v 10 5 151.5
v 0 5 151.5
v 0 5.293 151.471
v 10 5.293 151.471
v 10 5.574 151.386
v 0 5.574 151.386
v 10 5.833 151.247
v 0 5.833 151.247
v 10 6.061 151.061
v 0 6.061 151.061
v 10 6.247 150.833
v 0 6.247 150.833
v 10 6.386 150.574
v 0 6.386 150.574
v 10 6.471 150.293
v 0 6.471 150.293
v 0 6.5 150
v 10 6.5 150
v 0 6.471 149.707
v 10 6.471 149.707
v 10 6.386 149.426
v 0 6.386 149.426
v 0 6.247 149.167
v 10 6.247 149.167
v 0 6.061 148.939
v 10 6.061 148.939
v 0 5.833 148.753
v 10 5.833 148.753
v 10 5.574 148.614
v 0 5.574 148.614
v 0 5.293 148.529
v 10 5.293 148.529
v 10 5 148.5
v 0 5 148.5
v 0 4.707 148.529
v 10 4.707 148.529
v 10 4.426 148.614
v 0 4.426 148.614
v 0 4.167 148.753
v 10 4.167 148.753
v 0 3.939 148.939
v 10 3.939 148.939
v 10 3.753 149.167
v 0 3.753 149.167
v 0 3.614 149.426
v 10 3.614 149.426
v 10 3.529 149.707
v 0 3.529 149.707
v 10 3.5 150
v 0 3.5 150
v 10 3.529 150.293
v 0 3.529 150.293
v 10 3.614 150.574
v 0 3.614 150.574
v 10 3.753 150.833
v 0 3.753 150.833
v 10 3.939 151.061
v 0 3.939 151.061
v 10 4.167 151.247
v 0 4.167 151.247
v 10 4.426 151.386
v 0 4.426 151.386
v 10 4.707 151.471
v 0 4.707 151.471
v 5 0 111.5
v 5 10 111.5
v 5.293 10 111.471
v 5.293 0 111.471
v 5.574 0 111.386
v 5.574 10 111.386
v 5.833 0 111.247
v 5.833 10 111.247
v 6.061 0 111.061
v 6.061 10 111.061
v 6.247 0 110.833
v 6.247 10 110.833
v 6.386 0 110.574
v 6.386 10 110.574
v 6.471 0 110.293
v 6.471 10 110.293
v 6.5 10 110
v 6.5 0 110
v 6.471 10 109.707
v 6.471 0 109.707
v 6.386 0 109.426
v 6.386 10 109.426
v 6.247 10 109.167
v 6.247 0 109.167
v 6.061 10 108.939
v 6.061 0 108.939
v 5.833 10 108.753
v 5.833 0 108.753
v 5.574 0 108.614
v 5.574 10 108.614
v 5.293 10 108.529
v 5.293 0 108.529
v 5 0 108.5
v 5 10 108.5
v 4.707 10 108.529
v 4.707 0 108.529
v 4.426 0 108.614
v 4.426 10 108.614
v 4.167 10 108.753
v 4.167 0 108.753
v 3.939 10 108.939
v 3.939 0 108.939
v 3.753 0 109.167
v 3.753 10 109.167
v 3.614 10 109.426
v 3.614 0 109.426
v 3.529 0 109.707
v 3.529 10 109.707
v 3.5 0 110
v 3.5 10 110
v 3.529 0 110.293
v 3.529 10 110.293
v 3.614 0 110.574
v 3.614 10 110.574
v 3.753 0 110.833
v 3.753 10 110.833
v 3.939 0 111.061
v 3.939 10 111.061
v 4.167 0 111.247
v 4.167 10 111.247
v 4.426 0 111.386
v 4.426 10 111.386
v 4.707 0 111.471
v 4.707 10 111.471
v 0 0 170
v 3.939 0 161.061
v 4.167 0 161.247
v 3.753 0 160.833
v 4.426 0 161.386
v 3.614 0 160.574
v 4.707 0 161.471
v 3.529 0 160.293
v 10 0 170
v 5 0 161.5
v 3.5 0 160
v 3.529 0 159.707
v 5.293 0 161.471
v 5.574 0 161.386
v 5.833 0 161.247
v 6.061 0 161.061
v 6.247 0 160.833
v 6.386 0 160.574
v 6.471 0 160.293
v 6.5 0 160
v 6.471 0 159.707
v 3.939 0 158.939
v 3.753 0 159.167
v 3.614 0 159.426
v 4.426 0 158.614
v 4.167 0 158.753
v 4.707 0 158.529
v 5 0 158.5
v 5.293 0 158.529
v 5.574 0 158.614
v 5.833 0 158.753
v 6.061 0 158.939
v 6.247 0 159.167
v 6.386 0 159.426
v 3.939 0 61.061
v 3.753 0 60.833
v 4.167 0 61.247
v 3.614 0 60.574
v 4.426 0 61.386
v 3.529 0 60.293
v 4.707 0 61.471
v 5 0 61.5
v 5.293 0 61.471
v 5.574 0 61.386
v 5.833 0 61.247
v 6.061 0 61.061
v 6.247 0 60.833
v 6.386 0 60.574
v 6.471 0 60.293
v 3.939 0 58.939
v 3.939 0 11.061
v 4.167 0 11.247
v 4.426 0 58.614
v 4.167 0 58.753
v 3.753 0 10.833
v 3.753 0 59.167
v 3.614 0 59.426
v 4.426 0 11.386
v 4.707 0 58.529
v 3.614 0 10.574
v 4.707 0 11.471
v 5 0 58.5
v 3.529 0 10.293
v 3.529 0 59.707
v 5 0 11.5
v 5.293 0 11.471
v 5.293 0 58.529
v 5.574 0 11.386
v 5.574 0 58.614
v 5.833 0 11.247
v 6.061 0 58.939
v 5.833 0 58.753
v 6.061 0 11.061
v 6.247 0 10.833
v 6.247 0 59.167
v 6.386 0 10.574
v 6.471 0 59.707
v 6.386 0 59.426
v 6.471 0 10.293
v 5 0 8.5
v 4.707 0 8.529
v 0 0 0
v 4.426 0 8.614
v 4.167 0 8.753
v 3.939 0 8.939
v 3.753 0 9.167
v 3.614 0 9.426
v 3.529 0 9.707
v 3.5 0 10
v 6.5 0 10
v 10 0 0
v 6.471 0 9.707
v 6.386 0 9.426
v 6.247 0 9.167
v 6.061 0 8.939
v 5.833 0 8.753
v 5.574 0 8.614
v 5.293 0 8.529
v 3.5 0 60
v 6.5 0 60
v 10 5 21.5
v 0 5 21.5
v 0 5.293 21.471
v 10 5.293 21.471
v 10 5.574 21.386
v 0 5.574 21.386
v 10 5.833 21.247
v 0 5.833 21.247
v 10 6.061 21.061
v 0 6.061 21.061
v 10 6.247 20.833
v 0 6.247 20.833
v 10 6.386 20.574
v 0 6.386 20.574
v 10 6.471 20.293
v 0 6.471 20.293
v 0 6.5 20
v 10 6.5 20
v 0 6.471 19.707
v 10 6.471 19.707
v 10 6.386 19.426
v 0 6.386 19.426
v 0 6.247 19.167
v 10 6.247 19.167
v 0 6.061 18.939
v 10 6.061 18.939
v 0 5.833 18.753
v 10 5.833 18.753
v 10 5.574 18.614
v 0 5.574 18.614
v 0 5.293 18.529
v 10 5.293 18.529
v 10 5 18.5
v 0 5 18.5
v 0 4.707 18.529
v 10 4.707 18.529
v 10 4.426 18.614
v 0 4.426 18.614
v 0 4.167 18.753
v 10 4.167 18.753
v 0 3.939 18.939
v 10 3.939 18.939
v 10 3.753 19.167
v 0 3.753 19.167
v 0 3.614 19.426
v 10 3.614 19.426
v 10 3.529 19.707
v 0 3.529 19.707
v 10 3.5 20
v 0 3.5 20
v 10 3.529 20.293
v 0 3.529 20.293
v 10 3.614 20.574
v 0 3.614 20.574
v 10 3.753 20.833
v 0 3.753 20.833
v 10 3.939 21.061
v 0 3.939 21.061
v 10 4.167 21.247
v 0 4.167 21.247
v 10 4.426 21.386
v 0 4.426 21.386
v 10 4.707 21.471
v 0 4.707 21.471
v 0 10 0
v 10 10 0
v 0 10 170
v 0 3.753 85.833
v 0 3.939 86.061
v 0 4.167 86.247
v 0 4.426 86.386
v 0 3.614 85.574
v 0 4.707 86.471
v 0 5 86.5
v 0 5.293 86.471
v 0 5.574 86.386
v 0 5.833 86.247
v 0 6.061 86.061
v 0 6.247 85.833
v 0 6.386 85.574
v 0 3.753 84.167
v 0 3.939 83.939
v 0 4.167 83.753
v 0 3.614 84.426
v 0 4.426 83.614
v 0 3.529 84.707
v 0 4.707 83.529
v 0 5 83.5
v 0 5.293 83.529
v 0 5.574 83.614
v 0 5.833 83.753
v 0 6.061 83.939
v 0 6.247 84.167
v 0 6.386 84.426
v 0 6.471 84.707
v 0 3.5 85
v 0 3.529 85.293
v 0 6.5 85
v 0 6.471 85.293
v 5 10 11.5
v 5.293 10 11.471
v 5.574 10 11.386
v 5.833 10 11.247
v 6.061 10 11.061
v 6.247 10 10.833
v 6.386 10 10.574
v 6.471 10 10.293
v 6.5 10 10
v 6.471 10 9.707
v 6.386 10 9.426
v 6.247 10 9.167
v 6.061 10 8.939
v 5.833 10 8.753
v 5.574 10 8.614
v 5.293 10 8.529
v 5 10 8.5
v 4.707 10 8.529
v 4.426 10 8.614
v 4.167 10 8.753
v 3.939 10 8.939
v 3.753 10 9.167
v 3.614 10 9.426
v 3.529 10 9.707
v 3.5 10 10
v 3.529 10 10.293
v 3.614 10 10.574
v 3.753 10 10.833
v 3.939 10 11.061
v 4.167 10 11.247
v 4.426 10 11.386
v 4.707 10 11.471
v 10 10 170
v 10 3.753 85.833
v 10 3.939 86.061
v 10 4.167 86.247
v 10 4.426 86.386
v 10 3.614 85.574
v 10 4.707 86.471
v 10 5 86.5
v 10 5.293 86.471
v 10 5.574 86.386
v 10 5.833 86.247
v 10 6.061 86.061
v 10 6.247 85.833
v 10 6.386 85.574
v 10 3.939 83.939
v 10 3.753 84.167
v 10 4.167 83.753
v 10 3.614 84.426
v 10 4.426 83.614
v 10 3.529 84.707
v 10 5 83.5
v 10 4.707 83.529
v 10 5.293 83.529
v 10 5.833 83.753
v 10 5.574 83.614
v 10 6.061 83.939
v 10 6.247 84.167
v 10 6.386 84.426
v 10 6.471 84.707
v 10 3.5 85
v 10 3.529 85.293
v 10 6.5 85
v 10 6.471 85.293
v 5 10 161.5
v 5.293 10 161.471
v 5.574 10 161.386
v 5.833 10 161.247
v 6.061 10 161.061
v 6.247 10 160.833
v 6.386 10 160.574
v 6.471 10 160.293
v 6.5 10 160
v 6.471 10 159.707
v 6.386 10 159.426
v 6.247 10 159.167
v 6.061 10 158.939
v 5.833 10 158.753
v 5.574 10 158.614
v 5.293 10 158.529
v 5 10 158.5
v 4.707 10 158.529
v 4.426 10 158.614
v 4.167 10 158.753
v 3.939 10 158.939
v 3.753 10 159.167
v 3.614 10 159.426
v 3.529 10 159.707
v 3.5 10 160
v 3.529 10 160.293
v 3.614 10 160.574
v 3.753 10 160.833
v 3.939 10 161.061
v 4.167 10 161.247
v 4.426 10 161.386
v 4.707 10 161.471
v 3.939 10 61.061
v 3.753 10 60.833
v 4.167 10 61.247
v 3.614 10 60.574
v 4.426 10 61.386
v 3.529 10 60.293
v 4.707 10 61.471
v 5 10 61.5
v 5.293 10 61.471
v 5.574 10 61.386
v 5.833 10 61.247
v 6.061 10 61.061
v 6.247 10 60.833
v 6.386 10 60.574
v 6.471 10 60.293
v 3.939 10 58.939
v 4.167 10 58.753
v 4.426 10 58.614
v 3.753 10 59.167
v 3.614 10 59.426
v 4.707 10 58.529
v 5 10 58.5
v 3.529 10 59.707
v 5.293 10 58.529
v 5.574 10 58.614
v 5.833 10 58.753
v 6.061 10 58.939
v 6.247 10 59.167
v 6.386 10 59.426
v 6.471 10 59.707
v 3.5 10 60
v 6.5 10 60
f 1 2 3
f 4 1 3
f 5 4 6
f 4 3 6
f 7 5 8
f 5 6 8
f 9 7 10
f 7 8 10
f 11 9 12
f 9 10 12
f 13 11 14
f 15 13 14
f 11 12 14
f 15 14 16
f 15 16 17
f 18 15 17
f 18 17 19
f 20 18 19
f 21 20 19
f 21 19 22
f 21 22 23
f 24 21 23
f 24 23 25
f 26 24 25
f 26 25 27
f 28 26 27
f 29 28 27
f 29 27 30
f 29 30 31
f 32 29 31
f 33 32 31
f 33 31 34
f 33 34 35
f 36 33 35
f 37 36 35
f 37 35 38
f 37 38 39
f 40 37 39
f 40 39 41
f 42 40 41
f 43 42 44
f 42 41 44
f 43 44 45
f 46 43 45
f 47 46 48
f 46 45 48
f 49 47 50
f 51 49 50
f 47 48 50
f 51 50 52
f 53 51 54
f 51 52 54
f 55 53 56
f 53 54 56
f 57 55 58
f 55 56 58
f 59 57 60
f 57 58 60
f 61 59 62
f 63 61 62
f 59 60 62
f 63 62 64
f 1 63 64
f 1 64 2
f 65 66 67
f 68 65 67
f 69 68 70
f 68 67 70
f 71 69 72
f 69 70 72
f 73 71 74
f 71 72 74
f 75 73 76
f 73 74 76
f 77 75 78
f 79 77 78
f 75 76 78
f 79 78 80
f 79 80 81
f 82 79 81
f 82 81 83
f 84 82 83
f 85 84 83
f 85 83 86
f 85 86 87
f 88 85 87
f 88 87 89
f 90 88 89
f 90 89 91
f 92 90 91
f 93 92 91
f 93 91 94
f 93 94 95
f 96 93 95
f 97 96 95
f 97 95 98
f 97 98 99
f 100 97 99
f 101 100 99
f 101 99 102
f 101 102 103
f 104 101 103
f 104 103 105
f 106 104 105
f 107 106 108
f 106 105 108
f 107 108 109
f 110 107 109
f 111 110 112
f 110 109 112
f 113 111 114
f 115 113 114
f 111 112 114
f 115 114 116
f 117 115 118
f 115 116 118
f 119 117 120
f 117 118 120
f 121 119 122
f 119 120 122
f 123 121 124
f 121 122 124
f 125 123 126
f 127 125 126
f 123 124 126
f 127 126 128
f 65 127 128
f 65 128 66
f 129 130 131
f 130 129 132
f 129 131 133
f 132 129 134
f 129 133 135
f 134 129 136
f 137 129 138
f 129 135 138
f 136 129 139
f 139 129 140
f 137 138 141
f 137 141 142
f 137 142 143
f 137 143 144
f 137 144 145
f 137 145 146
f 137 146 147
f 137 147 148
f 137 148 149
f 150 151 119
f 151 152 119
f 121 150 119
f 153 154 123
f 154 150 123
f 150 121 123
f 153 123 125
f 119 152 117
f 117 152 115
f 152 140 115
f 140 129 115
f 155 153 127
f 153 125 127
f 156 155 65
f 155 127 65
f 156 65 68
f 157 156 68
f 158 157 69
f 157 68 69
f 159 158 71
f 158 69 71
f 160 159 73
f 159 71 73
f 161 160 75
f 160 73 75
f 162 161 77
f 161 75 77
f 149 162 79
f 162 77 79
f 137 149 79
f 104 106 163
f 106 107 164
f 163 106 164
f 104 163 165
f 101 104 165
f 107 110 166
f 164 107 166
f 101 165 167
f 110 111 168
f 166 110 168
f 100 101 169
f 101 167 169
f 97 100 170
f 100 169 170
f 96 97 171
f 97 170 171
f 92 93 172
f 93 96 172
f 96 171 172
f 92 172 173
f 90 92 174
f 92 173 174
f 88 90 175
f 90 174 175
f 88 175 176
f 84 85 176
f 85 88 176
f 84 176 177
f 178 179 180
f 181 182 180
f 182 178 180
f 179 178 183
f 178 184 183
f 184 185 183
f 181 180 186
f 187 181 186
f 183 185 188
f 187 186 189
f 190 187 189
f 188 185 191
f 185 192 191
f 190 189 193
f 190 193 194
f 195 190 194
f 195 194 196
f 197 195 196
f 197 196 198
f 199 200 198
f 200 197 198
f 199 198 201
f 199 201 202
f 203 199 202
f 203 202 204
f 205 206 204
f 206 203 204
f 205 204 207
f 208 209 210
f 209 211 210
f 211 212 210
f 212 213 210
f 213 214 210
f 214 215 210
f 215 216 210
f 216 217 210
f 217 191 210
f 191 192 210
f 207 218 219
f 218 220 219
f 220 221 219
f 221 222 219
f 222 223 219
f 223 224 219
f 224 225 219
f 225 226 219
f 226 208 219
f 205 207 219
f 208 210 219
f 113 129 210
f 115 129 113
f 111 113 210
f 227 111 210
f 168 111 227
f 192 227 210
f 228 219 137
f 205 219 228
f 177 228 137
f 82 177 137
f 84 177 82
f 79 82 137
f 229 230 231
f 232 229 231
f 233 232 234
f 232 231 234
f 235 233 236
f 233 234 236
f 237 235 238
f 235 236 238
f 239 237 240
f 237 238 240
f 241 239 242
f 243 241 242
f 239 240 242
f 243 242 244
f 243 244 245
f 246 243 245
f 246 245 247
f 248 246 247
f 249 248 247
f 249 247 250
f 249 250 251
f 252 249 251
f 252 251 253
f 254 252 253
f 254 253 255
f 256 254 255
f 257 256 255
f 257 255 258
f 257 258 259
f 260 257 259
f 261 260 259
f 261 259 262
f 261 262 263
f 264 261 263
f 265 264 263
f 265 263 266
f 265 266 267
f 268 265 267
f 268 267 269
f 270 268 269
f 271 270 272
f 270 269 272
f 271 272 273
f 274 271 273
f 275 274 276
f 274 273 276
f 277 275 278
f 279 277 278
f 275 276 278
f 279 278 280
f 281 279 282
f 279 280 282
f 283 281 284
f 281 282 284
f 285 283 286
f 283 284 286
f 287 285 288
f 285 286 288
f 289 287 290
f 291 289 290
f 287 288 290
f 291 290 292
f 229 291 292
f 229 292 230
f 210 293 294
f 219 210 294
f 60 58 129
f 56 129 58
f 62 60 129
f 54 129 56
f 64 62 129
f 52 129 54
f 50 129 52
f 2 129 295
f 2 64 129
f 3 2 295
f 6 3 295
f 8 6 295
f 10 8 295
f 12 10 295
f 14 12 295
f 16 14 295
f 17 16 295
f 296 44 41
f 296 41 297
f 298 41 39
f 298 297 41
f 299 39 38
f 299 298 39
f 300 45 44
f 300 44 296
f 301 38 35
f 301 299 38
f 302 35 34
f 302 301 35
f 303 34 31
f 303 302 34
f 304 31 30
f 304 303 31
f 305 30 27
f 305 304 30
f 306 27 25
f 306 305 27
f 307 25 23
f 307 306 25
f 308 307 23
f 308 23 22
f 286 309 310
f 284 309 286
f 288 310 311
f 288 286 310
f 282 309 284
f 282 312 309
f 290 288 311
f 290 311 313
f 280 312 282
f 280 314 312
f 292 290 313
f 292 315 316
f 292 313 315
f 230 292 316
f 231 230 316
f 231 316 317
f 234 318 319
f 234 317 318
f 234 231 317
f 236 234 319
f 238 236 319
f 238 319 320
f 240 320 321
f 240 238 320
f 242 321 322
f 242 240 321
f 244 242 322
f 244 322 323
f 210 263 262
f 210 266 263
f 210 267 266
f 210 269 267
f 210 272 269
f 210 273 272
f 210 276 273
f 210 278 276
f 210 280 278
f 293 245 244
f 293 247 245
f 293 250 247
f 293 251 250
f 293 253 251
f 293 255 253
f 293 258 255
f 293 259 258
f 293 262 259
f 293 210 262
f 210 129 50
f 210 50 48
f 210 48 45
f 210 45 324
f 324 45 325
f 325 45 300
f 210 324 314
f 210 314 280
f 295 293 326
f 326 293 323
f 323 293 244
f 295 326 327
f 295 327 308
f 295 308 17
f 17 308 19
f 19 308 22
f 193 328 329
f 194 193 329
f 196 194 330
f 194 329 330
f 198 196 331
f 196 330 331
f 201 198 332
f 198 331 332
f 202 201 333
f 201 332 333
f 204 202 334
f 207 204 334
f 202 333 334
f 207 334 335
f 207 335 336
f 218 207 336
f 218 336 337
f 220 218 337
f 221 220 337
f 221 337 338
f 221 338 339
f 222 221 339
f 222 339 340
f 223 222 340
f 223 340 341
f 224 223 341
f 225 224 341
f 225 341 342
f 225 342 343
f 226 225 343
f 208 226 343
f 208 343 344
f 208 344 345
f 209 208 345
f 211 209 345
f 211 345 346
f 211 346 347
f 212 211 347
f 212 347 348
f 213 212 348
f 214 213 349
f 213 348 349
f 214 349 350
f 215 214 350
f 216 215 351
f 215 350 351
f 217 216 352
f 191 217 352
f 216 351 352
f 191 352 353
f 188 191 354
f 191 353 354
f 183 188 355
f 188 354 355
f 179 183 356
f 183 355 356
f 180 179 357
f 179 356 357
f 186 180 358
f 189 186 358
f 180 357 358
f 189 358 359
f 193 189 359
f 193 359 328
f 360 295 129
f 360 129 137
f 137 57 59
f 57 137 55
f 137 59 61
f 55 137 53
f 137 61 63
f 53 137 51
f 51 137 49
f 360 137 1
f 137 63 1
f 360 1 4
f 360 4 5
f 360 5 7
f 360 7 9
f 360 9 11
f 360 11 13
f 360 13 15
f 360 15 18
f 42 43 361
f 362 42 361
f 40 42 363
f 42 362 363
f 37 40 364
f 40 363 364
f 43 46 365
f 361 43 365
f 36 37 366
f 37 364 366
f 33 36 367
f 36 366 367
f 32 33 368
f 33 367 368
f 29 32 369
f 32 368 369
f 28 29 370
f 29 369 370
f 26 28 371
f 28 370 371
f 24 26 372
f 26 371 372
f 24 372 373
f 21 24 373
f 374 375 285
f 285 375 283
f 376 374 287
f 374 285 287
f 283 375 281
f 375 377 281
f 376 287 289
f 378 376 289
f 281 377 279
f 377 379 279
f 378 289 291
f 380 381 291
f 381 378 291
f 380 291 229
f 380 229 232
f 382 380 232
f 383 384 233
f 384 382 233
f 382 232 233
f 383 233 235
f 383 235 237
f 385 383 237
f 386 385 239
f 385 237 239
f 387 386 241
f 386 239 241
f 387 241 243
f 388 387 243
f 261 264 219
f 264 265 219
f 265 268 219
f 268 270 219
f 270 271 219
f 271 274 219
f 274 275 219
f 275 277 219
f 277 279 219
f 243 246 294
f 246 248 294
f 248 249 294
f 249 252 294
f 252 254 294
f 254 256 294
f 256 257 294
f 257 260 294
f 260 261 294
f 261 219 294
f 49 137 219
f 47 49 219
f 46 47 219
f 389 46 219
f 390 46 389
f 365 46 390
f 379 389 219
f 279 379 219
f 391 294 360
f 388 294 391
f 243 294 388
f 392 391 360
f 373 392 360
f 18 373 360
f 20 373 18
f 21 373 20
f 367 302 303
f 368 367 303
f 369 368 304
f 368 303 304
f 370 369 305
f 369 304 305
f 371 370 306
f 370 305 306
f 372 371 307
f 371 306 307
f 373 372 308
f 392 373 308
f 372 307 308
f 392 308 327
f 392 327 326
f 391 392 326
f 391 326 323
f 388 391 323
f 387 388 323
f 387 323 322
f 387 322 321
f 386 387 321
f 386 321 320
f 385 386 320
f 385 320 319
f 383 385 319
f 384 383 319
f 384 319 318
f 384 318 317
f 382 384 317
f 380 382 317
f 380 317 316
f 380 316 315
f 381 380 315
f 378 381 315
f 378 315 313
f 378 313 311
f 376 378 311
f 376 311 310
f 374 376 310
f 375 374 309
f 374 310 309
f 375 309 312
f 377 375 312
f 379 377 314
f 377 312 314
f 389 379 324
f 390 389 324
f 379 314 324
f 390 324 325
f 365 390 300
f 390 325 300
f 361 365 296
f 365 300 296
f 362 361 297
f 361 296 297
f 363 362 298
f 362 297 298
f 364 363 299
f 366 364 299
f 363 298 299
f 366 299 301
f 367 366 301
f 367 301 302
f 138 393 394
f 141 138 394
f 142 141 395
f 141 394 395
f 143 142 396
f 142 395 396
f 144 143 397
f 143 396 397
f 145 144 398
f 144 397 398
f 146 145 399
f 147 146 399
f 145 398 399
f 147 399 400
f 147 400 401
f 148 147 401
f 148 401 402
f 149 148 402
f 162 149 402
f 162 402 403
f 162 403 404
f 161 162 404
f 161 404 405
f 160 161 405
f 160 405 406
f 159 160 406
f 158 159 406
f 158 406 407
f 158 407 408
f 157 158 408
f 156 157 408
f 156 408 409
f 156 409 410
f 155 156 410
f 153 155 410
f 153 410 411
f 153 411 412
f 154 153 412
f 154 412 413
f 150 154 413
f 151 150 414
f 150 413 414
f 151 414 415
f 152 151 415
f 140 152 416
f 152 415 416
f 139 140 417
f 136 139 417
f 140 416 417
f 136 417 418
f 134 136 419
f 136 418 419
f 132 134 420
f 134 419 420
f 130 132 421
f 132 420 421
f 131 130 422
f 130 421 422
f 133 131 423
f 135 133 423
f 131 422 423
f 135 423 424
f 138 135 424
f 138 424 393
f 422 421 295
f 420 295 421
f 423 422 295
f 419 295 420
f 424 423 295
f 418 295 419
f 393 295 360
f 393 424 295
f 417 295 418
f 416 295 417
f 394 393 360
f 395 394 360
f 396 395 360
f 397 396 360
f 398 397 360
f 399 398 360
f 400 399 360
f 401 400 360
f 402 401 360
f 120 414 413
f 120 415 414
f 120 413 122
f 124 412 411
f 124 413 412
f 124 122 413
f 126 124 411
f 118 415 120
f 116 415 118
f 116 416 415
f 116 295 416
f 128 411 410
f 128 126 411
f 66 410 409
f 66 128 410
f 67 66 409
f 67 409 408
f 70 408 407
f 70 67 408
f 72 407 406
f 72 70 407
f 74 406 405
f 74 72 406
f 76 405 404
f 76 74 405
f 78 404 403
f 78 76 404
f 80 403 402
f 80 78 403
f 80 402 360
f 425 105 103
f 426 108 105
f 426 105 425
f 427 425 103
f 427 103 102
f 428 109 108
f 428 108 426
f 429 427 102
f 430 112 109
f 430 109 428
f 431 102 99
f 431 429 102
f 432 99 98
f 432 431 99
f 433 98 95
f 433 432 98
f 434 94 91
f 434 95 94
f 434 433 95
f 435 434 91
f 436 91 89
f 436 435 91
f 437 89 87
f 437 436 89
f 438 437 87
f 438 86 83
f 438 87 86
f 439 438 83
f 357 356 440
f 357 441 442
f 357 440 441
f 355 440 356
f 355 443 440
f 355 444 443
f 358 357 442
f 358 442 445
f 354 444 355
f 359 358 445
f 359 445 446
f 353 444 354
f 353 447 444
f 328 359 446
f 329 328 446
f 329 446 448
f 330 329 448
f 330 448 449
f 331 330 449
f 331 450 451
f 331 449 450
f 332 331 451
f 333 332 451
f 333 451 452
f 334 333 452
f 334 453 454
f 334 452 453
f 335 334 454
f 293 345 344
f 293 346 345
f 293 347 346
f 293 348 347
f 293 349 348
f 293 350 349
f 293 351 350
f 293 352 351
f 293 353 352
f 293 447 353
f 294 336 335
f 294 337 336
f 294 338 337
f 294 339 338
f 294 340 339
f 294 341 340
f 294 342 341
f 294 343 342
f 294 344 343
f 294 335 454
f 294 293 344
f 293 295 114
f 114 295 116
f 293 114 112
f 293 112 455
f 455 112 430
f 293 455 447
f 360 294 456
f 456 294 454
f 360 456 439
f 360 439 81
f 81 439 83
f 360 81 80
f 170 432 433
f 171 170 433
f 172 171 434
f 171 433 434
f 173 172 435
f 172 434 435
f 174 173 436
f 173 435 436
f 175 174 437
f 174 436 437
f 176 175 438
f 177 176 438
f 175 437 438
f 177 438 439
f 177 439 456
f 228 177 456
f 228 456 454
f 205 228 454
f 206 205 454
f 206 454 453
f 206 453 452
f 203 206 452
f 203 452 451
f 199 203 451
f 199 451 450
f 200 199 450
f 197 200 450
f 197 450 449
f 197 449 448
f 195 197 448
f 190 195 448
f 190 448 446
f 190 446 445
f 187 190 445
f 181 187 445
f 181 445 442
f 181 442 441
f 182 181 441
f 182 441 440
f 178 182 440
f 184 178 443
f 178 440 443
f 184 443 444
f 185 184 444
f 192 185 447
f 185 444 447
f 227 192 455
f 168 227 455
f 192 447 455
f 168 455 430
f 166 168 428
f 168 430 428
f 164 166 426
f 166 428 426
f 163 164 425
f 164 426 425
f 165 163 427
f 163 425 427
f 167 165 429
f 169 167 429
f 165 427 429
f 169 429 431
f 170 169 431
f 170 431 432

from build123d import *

# Parameters (mm, degrees)
SKETCH1_W          = 10
SKETCH1_H          = 10
EXTRUDE1_DEPTH     = 170
SKETCH4_R          = 1.5
CUT_EXTRUDE3_DEPTH = 171.587221092
LPATTERN1_COUNT    = 4
LPATTERN1_PITCH    = 50
SKETCH5_R          = 1.5
CUT_EXTRUDE4_DEPTH = 171.587221092


with BuildPart() as part:
    # Sketch1 → Extrude1 (new body)
    with BuildSketch(Plane.XY):
        with Locations((5, 5)):
            Rectangle(SKETCH1_W, SKETCH1_H)
    extrude(amount=EXTRUDE1_DEPTH)

    # Sketch4 → Cut-Extrude3 (cut, through all)
    with BuildSketch(Plane(origin=(0, 10, 0), x_dir=(-1, 0, 0), z_dir=(0, 1, 0))):
        with Locations(Location((-5, 10, 0), (0, 0, 90))):
            Circle(SKETCH4_R)
    cut_extrude3 = extrude(amount=-CUT_EXTRUDE3_DEPTH, mode=Mode.SUBTRACT)

    # LPattern1: Cut-Extrude3 ×4
    with Locations(*[(0, 0, i * LPATTERN1_PITCH) for i in range(1, LPATTERN1_COUNT)]):
        add(cut_extrude3, mode=Mode.SUBTRACT)

    # Sketch5 → Cut-Extrude4 (cut, through all)
    with BuildSketch(Plane.ZY):
        with Locations((20, 5)):
            Circle(SKETCH5_R)
        with Locations((85, 5)):
            Circle(SKETCH5_R)
        with Locations((150, 5)):
            Circle(SKETCH5_R)
    extrude(amount=-CUT_EXTRUDE4_DEPTH, mode=Mode.SUBTRACT)


solid = part.part
